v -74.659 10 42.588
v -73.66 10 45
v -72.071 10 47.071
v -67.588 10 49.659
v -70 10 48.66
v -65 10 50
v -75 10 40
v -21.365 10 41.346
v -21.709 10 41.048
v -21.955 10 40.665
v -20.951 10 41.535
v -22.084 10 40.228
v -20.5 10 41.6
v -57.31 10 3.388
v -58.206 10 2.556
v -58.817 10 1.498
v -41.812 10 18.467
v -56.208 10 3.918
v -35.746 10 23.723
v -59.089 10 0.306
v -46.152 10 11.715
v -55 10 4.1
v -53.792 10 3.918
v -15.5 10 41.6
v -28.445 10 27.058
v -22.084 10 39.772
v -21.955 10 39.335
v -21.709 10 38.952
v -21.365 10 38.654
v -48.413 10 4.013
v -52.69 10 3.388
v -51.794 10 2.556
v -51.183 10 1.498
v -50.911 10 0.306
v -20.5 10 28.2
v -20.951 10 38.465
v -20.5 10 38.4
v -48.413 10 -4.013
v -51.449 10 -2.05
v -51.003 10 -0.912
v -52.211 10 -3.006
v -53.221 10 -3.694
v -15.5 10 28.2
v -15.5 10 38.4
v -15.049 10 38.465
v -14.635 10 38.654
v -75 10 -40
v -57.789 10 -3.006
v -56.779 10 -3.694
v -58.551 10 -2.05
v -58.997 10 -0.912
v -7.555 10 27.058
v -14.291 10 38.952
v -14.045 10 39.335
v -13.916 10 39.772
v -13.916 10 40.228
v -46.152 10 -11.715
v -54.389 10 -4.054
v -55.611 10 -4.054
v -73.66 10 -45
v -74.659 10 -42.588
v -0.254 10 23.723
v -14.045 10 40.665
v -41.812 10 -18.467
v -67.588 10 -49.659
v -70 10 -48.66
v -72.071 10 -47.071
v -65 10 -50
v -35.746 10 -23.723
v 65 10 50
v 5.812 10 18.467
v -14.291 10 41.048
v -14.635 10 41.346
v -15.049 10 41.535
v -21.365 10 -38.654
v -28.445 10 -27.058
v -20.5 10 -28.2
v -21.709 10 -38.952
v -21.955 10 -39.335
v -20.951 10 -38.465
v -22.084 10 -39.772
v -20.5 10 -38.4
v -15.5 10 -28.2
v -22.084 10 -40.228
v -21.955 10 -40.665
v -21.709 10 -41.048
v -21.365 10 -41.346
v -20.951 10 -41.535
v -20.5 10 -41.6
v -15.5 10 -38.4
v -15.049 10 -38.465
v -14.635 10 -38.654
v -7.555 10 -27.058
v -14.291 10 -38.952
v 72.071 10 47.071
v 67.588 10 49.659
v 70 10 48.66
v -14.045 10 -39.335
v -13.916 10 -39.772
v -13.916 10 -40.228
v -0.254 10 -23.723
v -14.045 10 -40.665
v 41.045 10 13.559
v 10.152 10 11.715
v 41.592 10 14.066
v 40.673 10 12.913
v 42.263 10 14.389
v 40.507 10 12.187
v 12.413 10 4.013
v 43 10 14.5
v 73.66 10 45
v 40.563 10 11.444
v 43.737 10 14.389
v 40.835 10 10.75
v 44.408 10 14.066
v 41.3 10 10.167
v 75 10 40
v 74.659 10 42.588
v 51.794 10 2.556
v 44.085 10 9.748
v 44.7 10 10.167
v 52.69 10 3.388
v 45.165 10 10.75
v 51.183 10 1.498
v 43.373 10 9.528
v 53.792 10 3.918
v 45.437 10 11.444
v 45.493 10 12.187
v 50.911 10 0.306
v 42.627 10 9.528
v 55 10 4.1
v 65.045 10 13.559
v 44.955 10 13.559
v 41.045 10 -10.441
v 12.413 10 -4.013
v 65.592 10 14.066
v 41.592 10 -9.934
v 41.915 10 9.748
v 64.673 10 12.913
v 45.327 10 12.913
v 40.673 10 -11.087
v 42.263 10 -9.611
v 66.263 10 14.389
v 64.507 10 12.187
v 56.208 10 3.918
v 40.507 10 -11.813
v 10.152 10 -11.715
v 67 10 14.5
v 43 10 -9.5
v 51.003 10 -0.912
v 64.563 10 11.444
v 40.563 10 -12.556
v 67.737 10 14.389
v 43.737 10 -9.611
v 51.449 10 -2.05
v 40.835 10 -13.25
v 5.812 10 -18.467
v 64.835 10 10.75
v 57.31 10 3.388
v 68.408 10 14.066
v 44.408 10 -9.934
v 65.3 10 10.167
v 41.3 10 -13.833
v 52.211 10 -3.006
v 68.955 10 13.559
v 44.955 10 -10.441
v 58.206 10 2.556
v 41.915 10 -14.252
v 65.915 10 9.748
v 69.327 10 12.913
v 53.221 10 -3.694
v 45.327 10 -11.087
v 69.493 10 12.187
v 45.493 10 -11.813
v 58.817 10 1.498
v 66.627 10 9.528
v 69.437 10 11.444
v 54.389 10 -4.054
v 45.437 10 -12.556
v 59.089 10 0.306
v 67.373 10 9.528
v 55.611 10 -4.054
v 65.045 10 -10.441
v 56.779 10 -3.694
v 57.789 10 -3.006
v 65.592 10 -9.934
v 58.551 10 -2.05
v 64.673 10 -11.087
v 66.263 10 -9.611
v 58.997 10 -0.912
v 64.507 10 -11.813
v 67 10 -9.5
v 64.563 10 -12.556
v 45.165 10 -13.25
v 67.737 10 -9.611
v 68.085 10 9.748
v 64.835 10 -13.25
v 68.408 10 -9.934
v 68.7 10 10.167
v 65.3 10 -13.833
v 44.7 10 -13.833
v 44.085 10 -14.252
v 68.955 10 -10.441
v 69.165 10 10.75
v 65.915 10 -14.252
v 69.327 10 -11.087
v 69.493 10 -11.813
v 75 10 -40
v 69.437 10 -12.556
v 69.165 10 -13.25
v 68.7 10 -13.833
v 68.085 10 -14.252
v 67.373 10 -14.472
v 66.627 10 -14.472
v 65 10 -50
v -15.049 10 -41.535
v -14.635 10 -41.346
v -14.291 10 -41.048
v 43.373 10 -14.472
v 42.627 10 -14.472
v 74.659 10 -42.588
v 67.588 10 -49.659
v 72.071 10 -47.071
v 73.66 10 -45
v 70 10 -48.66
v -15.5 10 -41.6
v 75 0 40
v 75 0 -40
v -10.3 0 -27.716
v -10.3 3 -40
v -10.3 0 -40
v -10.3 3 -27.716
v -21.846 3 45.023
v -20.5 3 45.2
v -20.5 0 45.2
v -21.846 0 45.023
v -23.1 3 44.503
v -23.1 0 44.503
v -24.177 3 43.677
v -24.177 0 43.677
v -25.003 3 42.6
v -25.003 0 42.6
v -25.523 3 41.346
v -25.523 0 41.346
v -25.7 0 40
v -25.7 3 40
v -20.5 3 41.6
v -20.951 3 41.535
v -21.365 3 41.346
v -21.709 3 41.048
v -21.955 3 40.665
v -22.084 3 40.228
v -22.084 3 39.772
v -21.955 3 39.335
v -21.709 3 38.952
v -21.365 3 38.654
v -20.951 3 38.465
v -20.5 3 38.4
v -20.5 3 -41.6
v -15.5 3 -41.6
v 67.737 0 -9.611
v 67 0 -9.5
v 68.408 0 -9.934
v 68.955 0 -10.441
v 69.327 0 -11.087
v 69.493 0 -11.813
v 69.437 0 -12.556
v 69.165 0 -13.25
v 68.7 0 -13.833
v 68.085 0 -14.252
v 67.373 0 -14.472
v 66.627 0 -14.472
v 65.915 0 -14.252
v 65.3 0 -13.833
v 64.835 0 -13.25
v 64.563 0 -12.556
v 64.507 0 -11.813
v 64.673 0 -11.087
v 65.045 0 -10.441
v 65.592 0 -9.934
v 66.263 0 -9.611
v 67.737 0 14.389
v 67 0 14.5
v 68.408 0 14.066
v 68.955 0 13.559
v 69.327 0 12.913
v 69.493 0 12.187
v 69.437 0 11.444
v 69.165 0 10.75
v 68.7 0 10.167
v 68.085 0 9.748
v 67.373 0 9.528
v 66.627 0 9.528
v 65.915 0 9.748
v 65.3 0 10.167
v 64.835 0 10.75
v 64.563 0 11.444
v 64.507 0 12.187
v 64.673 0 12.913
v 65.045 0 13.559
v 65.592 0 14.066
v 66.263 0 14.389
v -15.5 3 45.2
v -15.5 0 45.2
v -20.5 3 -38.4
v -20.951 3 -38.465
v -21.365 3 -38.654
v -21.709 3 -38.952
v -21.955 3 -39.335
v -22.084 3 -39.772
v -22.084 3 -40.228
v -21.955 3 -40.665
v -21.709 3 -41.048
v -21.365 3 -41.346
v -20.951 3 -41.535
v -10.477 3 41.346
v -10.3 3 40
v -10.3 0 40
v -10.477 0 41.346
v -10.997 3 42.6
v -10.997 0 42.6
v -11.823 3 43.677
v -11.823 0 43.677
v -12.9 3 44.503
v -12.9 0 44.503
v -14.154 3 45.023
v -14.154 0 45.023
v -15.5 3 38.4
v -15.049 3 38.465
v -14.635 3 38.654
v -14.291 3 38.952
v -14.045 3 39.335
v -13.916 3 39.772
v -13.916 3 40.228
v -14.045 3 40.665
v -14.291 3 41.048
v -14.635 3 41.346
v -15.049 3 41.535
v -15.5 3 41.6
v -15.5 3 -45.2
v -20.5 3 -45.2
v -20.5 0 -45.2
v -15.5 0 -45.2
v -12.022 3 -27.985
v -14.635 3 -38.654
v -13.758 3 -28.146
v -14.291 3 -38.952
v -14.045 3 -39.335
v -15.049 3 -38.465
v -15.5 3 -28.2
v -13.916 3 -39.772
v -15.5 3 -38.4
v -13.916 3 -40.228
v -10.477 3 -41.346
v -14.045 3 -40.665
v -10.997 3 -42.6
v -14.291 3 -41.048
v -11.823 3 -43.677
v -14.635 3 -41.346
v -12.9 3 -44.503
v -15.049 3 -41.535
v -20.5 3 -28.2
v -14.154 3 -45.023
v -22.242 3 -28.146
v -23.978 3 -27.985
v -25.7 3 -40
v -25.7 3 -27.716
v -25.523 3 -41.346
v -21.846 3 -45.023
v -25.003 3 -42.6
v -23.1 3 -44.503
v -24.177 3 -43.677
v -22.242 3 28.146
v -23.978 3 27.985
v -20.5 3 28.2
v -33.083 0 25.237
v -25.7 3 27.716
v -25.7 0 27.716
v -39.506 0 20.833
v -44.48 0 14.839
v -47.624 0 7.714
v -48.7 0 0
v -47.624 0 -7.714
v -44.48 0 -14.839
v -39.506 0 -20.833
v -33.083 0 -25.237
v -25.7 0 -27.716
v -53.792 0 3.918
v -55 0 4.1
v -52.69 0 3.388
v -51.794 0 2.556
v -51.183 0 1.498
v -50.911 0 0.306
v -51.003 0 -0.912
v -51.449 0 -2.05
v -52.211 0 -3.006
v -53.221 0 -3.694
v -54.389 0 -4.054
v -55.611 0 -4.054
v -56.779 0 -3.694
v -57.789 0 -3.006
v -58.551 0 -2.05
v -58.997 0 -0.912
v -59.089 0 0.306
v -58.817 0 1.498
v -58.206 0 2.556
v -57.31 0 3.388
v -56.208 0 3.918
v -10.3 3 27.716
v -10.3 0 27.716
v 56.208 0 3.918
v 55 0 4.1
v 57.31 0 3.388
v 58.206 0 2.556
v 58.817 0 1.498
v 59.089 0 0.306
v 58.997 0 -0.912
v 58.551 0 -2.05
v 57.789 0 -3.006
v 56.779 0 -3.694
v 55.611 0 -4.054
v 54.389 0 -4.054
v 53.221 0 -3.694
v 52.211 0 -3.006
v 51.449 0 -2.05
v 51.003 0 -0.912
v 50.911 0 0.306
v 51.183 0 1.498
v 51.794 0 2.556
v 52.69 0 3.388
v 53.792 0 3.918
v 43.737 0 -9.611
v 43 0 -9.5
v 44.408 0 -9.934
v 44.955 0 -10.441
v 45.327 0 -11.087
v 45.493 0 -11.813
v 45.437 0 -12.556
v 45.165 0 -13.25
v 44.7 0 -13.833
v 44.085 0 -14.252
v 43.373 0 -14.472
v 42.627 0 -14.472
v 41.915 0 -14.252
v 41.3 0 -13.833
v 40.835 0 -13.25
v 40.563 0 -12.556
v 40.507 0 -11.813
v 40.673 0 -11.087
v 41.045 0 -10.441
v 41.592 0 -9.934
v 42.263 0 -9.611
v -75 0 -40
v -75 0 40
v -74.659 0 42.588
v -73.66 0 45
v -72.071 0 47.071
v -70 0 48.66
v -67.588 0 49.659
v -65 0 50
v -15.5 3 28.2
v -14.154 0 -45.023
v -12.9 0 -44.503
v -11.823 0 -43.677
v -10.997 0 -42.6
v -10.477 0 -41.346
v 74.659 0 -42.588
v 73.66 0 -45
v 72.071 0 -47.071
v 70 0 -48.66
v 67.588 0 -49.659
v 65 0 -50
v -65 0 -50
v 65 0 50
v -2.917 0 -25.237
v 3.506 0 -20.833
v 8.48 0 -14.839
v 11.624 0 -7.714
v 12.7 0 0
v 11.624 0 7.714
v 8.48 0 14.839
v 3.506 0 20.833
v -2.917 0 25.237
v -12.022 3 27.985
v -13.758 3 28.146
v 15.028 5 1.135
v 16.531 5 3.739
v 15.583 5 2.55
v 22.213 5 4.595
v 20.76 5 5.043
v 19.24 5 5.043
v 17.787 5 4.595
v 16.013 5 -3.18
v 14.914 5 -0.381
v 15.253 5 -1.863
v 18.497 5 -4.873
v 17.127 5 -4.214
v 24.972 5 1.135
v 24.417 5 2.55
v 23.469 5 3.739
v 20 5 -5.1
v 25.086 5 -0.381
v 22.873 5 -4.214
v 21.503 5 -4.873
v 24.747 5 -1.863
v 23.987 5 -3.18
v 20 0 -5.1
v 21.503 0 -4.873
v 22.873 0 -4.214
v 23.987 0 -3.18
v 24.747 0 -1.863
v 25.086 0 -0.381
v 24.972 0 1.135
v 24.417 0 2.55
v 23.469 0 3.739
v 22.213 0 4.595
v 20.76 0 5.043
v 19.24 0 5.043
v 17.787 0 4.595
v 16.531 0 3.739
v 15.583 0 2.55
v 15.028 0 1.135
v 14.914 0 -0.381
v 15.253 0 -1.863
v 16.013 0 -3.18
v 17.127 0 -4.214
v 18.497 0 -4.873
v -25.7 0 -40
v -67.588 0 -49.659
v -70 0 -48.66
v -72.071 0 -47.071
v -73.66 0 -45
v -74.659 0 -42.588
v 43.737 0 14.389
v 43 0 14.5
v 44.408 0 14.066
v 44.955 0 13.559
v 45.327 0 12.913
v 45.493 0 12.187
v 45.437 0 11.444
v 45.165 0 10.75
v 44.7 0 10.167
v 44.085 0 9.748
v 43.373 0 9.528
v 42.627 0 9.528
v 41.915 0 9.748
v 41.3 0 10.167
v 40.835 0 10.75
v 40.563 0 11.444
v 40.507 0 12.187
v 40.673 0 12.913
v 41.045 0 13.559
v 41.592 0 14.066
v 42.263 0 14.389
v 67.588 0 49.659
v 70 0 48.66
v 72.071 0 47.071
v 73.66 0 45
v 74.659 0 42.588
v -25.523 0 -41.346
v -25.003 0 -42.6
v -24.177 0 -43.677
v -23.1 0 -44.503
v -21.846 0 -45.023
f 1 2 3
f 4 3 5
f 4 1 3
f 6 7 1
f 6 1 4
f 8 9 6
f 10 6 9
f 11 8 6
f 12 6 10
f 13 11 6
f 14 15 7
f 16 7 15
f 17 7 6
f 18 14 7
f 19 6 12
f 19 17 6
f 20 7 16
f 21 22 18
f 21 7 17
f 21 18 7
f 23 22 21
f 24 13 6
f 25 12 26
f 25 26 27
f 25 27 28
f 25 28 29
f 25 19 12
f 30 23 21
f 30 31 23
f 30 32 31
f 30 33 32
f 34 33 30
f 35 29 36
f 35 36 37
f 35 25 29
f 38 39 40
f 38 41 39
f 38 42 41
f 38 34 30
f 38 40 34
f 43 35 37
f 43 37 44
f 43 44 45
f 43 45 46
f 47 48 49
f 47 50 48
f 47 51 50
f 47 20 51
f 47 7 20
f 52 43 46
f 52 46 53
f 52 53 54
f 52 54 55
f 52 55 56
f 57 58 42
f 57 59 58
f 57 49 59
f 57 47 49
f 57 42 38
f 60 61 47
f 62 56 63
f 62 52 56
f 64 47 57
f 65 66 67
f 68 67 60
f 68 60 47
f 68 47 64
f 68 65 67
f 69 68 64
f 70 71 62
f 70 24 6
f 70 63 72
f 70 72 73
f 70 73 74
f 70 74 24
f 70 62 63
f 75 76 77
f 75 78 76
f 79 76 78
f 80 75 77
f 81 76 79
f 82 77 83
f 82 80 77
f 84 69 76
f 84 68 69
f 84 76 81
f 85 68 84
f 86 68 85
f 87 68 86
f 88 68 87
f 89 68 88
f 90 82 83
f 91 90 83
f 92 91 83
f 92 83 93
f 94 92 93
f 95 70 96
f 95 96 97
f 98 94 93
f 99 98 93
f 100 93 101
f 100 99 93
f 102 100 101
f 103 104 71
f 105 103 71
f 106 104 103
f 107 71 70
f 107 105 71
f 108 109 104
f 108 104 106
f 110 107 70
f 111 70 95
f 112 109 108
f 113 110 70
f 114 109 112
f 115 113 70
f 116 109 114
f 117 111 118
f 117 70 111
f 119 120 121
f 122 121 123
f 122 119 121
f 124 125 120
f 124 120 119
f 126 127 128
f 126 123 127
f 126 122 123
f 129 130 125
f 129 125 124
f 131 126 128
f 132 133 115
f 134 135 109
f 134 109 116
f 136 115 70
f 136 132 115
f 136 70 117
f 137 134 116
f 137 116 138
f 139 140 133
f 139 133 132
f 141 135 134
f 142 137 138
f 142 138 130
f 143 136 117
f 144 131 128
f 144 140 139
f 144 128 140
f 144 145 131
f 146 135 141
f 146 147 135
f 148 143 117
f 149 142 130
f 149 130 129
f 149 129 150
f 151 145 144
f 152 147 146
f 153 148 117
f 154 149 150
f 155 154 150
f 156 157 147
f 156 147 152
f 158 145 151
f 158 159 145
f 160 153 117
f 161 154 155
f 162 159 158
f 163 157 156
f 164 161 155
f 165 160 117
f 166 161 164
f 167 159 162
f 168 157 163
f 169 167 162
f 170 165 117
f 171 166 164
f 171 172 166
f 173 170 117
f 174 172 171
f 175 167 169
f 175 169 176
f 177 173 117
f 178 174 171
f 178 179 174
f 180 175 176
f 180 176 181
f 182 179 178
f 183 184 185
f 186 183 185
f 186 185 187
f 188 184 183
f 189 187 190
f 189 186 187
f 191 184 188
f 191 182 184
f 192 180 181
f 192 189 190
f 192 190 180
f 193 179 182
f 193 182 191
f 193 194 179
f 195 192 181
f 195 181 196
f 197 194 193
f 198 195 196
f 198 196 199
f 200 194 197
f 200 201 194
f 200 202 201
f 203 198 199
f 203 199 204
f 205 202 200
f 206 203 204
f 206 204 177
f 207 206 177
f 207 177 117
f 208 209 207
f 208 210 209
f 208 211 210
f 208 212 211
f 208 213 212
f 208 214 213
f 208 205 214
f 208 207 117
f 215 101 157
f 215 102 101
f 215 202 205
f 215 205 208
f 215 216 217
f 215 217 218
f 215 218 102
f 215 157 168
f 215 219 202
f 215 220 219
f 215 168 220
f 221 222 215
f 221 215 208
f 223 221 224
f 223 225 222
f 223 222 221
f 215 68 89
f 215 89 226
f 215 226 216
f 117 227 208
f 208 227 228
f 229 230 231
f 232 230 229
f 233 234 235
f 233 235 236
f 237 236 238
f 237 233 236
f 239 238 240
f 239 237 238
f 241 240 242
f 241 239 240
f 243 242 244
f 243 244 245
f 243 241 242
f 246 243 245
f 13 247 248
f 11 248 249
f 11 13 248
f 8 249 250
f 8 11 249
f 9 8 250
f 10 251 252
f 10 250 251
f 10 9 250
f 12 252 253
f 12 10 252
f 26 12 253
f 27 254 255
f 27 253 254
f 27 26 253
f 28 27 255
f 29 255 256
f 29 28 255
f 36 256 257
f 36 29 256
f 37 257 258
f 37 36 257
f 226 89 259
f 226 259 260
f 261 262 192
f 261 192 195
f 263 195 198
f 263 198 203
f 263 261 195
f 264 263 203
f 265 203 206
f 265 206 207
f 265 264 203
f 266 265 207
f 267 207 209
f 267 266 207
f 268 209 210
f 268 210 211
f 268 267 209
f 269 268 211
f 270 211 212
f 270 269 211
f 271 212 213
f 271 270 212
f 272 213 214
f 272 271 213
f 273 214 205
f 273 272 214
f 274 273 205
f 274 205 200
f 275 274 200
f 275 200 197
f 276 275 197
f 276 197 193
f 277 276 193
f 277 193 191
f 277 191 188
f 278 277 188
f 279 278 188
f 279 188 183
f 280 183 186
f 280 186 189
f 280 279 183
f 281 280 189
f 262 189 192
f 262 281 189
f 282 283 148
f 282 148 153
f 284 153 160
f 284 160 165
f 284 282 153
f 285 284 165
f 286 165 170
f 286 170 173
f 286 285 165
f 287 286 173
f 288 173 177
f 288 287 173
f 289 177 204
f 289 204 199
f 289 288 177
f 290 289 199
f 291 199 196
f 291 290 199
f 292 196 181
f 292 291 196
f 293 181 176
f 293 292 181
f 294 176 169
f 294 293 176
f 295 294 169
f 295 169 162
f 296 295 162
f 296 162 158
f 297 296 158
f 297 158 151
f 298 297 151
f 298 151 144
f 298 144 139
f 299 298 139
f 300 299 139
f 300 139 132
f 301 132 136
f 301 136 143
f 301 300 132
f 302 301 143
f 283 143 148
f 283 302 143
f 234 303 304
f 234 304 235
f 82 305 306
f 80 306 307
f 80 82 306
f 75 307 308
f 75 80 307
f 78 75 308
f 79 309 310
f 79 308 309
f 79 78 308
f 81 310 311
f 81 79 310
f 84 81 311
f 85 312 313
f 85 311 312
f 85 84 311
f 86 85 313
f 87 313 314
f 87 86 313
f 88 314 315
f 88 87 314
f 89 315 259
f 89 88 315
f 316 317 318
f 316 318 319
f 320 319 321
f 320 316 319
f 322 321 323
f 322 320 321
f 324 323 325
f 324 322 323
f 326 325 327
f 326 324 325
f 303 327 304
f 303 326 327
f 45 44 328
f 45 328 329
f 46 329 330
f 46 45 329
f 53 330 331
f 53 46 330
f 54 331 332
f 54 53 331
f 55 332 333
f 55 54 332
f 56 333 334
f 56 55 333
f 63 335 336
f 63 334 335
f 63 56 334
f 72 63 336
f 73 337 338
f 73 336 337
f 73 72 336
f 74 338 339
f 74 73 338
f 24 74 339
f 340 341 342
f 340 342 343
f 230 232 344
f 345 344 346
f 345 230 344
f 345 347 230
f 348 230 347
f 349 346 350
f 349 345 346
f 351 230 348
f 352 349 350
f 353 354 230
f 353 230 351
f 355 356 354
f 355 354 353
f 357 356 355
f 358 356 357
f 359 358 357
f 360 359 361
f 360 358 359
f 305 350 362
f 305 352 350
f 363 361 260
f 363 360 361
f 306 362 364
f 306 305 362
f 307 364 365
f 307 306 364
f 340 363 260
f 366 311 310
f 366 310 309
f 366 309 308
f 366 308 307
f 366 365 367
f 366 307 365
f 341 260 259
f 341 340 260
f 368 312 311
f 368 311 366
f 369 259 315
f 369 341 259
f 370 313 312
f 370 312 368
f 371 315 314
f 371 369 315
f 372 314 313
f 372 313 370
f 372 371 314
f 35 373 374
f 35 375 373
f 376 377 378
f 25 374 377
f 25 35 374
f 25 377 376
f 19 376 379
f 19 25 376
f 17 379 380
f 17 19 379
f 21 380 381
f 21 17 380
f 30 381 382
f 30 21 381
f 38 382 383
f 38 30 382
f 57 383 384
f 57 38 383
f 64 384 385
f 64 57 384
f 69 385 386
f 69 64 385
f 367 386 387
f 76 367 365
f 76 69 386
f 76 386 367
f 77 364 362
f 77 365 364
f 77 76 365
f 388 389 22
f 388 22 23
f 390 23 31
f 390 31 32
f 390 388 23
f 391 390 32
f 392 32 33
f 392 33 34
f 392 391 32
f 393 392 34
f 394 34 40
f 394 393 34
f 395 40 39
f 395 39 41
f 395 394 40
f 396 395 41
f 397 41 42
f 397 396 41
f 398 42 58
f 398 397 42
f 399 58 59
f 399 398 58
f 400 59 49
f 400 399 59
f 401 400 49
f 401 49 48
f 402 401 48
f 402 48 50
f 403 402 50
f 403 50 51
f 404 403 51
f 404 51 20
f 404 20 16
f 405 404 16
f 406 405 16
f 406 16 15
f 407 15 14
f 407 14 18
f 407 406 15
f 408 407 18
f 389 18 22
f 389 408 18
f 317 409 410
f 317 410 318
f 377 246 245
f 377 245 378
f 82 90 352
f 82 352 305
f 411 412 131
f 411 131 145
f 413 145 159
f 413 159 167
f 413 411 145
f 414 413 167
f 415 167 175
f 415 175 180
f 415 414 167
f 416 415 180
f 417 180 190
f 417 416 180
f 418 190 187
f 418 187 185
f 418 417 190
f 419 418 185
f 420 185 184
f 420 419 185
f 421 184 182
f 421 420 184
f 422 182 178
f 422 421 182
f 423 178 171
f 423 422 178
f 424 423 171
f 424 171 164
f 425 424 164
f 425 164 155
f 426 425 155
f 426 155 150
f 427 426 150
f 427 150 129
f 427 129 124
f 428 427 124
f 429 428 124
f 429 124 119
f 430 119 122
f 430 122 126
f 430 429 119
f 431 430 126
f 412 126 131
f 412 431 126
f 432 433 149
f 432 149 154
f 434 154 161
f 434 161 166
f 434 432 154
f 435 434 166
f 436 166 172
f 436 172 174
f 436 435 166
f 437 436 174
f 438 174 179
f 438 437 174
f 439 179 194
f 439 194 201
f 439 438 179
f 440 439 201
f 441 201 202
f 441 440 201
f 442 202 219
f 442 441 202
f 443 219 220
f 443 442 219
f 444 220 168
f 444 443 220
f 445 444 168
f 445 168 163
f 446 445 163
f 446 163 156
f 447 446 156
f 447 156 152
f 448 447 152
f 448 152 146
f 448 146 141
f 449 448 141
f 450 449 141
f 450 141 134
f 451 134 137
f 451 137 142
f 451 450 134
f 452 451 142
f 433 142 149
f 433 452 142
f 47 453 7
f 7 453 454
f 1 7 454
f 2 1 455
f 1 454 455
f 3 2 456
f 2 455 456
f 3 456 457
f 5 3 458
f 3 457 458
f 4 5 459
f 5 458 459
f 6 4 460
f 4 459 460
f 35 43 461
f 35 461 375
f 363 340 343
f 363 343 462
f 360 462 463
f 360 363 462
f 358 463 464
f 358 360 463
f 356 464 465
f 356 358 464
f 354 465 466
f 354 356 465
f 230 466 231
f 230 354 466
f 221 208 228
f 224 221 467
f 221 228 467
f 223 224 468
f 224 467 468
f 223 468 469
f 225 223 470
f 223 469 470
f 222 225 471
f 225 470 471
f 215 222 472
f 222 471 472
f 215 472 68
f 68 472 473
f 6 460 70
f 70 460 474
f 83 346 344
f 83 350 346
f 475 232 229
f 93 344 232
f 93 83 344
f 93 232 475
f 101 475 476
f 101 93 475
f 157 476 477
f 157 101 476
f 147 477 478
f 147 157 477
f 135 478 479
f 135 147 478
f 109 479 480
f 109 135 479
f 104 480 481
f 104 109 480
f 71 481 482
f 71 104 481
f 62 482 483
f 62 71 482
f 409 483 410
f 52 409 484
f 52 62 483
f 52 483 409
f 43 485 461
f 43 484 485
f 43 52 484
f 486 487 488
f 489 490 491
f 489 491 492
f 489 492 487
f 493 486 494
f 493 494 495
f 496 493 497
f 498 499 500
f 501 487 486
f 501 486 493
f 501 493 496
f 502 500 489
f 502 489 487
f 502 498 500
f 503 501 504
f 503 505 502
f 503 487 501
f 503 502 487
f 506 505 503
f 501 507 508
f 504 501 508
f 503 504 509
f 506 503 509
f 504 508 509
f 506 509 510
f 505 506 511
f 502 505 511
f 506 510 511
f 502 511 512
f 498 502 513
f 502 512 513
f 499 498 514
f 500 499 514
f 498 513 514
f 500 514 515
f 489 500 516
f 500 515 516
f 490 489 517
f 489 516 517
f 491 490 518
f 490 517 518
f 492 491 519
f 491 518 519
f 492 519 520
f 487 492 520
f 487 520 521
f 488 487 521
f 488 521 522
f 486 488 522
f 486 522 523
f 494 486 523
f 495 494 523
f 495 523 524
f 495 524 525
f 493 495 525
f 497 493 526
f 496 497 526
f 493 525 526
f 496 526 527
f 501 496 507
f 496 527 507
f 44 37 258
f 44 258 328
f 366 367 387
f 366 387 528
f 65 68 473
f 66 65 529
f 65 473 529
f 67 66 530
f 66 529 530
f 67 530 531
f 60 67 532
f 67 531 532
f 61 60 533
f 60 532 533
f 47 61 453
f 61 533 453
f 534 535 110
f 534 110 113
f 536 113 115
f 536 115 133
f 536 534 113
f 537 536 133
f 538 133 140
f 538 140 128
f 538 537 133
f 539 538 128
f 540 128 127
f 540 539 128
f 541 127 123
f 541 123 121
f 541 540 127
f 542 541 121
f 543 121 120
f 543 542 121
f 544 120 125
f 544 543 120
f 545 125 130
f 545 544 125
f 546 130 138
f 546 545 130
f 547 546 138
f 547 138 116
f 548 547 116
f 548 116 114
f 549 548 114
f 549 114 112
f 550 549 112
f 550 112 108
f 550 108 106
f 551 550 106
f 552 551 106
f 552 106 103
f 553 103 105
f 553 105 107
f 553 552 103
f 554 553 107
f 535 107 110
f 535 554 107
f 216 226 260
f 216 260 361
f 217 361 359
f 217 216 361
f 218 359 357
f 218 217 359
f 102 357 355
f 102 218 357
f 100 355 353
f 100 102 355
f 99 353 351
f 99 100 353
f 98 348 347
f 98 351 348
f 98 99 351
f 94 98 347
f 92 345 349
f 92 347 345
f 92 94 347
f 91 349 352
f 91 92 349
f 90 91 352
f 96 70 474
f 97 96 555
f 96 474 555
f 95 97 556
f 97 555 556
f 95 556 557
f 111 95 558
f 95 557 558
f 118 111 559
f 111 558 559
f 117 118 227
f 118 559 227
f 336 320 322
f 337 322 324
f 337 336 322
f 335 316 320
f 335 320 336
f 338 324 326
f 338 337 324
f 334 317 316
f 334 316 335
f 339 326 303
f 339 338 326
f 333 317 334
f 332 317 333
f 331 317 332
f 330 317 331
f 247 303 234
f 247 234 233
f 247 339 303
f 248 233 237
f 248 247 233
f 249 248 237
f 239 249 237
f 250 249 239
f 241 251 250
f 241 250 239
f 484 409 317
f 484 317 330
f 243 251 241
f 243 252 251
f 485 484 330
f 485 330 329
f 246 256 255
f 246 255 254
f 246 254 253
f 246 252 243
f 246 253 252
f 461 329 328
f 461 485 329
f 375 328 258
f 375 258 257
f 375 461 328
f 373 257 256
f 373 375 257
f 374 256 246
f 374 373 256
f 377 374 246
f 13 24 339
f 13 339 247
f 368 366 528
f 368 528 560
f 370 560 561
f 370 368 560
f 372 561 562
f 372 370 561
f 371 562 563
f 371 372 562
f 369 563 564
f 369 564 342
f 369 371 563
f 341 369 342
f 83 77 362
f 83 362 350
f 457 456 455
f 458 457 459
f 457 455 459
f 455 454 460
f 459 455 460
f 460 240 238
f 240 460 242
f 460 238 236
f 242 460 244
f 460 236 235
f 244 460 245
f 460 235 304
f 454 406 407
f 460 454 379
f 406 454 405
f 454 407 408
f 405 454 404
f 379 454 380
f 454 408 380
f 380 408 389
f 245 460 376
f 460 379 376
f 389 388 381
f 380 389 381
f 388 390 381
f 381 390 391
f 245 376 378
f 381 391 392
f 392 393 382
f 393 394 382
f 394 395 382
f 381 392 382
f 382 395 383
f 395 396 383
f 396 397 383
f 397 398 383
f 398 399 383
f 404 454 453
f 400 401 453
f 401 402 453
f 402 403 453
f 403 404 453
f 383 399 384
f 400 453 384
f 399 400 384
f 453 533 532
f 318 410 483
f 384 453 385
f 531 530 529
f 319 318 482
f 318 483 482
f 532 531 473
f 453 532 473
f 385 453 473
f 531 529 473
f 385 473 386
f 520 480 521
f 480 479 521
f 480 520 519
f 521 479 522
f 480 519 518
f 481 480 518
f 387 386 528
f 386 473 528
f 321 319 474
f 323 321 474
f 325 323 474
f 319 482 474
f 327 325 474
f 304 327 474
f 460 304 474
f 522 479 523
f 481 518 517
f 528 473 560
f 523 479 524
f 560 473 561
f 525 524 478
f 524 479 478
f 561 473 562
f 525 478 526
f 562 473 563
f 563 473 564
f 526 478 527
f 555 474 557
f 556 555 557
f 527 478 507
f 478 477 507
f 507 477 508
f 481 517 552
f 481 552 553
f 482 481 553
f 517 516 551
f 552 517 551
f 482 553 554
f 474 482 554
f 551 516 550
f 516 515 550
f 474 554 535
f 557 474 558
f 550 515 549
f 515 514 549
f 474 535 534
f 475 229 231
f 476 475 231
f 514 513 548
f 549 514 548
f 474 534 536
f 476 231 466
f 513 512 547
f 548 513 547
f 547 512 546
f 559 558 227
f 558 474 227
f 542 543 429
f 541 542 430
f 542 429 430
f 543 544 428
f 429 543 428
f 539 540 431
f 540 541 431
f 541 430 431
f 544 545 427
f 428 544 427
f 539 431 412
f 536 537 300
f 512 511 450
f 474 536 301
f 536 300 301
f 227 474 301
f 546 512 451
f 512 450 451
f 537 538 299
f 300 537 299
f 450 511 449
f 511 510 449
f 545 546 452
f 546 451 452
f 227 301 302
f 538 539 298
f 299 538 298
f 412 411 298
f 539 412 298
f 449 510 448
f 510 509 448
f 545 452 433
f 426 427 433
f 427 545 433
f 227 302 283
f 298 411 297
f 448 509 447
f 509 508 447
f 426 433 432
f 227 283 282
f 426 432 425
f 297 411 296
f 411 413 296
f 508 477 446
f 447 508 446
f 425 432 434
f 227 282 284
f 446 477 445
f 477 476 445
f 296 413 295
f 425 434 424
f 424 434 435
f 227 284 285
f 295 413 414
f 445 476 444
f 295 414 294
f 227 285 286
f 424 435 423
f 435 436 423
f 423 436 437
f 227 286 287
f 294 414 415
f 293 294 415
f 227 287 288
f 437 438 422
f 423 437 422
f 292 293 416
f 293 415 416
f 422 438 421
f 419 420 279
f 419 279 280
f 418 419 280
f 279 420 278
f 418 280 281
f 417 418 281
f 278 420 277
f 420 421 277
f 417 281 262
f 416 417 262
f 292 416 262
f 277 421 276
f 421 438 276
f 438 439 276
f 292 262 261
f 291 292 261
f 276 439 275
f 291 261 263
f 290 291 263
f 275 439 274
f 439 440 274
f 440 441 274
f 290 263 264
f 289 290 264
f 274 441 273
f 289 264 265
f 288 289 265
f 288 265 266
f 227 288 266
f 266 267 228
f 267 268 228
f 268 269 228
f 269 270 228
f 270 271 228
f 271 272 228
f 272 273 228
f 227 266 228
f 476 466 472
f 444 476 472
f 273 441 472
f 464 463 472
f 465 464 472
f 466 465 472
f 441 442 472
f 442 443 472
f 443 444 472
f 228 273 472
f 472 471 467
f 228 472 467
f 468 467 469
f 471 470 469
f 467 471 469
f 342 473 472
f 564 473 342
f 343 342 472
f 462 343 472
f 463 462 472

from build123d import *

# Parameters (mm, degrees)
SKETCH_1_R          = 4.1
SKETCH_1_R_2        = 2.5
EXTRUDE_1_DEPTH     = 10
CUT_EXTRUDE_3_REACH = 92.692
CUT_EXTRUDE_START   = 3
CUT_EXTRUDE_4_DEPTH = 3
SKETCH_7_R          = 5.1
CUT_EXTRUDE_5_DEPTH = 5


with BuildPart() as part:
    # ｽｹｯﾁ1 → ﾎﾞｽ - 押し出し1 (new body)
    with BuildSketch(Plane(origin=(0, 0, 0), x_dir=(1, 0, 0), z_dir=(0, 1, 0))):
        with BuildLine():
            Line((-65, -50), (65, -50))
            ThreePointArc((65, -50), (72.071067812, -47.071067812), (75, -40))
            Line((75, -40), (75, 40))
            ThreePointArc((75, 40), (72.071067812, 47.071067812), (65, 50))
            Line((65, 50), (-65, 50))
            ThreePointArc((-65, 50), (-72.071067812, 47.071067812), (-75, 40))
            Line((-75, 40), (-75, -40))
            ThreePointArc((-75, -40), (-72.071067812, -47.071067812), (-65, -50))
        make_face()
        with Locations(Location((55, 0, 0), (0, 0, 270))):
            Circle(SKETCH_1_R, mode=Mode.SUBTRACT)
        with Locations(Location((43, 12, 0), (0, 0, 270))):
            Circle(SKETCH_1_R_2, mode=Mode.SUBTRACT)
        with Locations(Location((67, 12, 0), (0, 0, 270))):
            Circle(SKETCH_1_R_2, mode=Mode.SUBTRACT)
        with Locations(Location((67, -12, 0), (0, 0, 270))):
            Circle(SKETCH_1_R_2, mode=Mode.SUBTRACT)
        with Locations(Location((43, -12, 0), (0, 0, 270))):
            Circle(SKETCH_1_R_2, mode=Mode.SUBTRACT)
        with Locations(Location((-55, 0, 0), (0, 0, 270))):
            Circle(SKETCH_1_R, mode=Mode.SUBTRACT)
    extrude(amount=EXTRUDE_1_DEPTH)

    # ｽｹｯﾁ5 → ｶｯﾄ - 押し出し3 (cut, up to next)
    with BuildSketch(Plane(origin=(0, 10, 0), x_dir=(1, 0, 0), z_dir=(0, 1, 0)), mode=Mode.PRIVATE) as cut_extrude_3_sk1:
        with BuildLine():
            Line((-20.5, 28.2), (-15.5, 28.2))
            ThreePointArc((-15.5, 28.2), (12.7, 0), (-15.5, -28.2))
            Line((-15.5, -28.2), (-20.5, -28.2))
            ThreePointArc((-20.5, -28.2), (-48.7, 0), (-20.5, 28.2))
        make_face()
    cut_extrude_3_tool1 = extrude(cut_extrude_3_sk1.sketch, amount=-CUT_EXTRUDE_3_REACH, mode=Mode.PRIVATE) & part.part
    # ｽｹｯﾁ5 → ｶｯﾄ - 押し出し3 (cut, up to next)
    with BuildSketch(Plane(origin=(0, 10, 0), x_dir=(1, 0, 0), z_dir=(0, 1, 0)), mode=Mode.PRIVATE) as cut_extrude_3_sk2:
        with BuildLine():
            Line((-20.5, 41.6), (-15.5, 41.6))
            ThreePointArc((-15.5, 41.6), (-13.9, 40), (-15.5, 38.4))
            Line((-15.5, 38.4), (-20.5, 38.4))
            ThreePointArc((-20.5, 38.4), (-22.1, 40), (-20.5, 41.6))
        make_face()
    cut_extrude_3_tool2 = extrude(cut_extrude_3_sk2.sketch, amount=-CUT_EXTRUDE_3_REACH, mode=Mode.PRIVATE) & part.part
    # ｽｹｯﾁ5 → ｶｯﾄ - 押し出し3 (cut, up to next)
    with BuildSketch(Plane(origin=(0, 10, 0), x_dir=(1, 0, 0), z_dir=(0, 1, 0)), mode=Mode.PRIVATE) as cut_extrude_3_sk3:
        with BuildLine():
            Line((-20.5, -38.4), (-15.5, -38.4))
            ThreePointArc((-15.5, -38.4), (-13.9, -40), (-15.5, -41.6))
            Line((-15.5, -41.6), (-20.5, -41.6))
            ThreePointArc((-20.5, -41.6), (-22.1, -40), (-20.5, -38.4))
        make_face()
    cut_extrude_3_tool3 = extrude(cut_extrude_3_sk3.sketch, amount=-CUT_EXTRUDE_3_REACH, mode=Mode.PRIVATE) & part.part
    add(cut_extrude_3_tool1.solids().sort_by_distance((-18, 10, 0))[0], mode=Mode.SUBTRACT)
    add(cut_extrude_3_tool2.solids().sort_by_distance((-18, 10, -40))[0], mode=Mode.SUBTRACT)
    add(cut_extrude_3_tool3.solids().sort_by_distance((-18, 10, 40))[0], mode=Mode.SUBTRACT)

    # ｽｹｯﾁ6 → ｶｯﾄ - 押し出し4 (cut)
    with BuildSketch(Plane(origin=(0, 0, 0), x_dir=(1, 0, 0), z_dir=(0, 1, 0)).offset(CUT_EXTRUDE_START)):
        with BuildLine():
            Line((-20.5, 45.2), (-15.5, 45.2))
            ThreePointArc((-15.5, 45.2), (-11.823044738, 43.676955262), (-10.3, 40))
            Line((-10.3, 40), (-10.3, 27.716421125))
            ThreePointArc((-10.3, 27.716421125), (12.7, 0), (-10.3, -27.716421125))
            Line((-10.3, -27.716421125), (-10.3, -40))
            ThreePointArc((-10.3, -40), (-11.823044738, -43.676955262), (-15.5, -45.2))
            Line((-15.5, -45.2), (-20.5, -45.2))
            ThreePointArc((-20.5, -45.2), (-24.176955262, -43.676955262), (-25.7, -40))
            Line((-25.7, -40), (-25.7, -27.716421125))
            ThreePointArc((-25.7, -27.716421125), (-48.7, 0), (-25.7, 27.716421125))
            Line((-25.7, 27.716421125), (-25.7, 40))
            ThreePointArc((-25.7, 40), (-24.176955262, 43.676955262), (-20.5, 45.2))
        make_face()
    extrude(amount=-CUT_EXTRUDE_4_DEPTH, mode=Mode.SUBTRACT)

    # ｽｹｯﾁ7 → ｶｯﾄ - 押し出し5 (cut)
    with BuildSketch(Plane.XZ):
        with Locations(Location((20, 0, 0), (0, 0, 270))):
            Circle(SKETCH_7_R)
    extrude(amount=-CUT_EXTRUDE_5_DEPTH, mode=Mode.SUBTRACT)


solid = part.part
